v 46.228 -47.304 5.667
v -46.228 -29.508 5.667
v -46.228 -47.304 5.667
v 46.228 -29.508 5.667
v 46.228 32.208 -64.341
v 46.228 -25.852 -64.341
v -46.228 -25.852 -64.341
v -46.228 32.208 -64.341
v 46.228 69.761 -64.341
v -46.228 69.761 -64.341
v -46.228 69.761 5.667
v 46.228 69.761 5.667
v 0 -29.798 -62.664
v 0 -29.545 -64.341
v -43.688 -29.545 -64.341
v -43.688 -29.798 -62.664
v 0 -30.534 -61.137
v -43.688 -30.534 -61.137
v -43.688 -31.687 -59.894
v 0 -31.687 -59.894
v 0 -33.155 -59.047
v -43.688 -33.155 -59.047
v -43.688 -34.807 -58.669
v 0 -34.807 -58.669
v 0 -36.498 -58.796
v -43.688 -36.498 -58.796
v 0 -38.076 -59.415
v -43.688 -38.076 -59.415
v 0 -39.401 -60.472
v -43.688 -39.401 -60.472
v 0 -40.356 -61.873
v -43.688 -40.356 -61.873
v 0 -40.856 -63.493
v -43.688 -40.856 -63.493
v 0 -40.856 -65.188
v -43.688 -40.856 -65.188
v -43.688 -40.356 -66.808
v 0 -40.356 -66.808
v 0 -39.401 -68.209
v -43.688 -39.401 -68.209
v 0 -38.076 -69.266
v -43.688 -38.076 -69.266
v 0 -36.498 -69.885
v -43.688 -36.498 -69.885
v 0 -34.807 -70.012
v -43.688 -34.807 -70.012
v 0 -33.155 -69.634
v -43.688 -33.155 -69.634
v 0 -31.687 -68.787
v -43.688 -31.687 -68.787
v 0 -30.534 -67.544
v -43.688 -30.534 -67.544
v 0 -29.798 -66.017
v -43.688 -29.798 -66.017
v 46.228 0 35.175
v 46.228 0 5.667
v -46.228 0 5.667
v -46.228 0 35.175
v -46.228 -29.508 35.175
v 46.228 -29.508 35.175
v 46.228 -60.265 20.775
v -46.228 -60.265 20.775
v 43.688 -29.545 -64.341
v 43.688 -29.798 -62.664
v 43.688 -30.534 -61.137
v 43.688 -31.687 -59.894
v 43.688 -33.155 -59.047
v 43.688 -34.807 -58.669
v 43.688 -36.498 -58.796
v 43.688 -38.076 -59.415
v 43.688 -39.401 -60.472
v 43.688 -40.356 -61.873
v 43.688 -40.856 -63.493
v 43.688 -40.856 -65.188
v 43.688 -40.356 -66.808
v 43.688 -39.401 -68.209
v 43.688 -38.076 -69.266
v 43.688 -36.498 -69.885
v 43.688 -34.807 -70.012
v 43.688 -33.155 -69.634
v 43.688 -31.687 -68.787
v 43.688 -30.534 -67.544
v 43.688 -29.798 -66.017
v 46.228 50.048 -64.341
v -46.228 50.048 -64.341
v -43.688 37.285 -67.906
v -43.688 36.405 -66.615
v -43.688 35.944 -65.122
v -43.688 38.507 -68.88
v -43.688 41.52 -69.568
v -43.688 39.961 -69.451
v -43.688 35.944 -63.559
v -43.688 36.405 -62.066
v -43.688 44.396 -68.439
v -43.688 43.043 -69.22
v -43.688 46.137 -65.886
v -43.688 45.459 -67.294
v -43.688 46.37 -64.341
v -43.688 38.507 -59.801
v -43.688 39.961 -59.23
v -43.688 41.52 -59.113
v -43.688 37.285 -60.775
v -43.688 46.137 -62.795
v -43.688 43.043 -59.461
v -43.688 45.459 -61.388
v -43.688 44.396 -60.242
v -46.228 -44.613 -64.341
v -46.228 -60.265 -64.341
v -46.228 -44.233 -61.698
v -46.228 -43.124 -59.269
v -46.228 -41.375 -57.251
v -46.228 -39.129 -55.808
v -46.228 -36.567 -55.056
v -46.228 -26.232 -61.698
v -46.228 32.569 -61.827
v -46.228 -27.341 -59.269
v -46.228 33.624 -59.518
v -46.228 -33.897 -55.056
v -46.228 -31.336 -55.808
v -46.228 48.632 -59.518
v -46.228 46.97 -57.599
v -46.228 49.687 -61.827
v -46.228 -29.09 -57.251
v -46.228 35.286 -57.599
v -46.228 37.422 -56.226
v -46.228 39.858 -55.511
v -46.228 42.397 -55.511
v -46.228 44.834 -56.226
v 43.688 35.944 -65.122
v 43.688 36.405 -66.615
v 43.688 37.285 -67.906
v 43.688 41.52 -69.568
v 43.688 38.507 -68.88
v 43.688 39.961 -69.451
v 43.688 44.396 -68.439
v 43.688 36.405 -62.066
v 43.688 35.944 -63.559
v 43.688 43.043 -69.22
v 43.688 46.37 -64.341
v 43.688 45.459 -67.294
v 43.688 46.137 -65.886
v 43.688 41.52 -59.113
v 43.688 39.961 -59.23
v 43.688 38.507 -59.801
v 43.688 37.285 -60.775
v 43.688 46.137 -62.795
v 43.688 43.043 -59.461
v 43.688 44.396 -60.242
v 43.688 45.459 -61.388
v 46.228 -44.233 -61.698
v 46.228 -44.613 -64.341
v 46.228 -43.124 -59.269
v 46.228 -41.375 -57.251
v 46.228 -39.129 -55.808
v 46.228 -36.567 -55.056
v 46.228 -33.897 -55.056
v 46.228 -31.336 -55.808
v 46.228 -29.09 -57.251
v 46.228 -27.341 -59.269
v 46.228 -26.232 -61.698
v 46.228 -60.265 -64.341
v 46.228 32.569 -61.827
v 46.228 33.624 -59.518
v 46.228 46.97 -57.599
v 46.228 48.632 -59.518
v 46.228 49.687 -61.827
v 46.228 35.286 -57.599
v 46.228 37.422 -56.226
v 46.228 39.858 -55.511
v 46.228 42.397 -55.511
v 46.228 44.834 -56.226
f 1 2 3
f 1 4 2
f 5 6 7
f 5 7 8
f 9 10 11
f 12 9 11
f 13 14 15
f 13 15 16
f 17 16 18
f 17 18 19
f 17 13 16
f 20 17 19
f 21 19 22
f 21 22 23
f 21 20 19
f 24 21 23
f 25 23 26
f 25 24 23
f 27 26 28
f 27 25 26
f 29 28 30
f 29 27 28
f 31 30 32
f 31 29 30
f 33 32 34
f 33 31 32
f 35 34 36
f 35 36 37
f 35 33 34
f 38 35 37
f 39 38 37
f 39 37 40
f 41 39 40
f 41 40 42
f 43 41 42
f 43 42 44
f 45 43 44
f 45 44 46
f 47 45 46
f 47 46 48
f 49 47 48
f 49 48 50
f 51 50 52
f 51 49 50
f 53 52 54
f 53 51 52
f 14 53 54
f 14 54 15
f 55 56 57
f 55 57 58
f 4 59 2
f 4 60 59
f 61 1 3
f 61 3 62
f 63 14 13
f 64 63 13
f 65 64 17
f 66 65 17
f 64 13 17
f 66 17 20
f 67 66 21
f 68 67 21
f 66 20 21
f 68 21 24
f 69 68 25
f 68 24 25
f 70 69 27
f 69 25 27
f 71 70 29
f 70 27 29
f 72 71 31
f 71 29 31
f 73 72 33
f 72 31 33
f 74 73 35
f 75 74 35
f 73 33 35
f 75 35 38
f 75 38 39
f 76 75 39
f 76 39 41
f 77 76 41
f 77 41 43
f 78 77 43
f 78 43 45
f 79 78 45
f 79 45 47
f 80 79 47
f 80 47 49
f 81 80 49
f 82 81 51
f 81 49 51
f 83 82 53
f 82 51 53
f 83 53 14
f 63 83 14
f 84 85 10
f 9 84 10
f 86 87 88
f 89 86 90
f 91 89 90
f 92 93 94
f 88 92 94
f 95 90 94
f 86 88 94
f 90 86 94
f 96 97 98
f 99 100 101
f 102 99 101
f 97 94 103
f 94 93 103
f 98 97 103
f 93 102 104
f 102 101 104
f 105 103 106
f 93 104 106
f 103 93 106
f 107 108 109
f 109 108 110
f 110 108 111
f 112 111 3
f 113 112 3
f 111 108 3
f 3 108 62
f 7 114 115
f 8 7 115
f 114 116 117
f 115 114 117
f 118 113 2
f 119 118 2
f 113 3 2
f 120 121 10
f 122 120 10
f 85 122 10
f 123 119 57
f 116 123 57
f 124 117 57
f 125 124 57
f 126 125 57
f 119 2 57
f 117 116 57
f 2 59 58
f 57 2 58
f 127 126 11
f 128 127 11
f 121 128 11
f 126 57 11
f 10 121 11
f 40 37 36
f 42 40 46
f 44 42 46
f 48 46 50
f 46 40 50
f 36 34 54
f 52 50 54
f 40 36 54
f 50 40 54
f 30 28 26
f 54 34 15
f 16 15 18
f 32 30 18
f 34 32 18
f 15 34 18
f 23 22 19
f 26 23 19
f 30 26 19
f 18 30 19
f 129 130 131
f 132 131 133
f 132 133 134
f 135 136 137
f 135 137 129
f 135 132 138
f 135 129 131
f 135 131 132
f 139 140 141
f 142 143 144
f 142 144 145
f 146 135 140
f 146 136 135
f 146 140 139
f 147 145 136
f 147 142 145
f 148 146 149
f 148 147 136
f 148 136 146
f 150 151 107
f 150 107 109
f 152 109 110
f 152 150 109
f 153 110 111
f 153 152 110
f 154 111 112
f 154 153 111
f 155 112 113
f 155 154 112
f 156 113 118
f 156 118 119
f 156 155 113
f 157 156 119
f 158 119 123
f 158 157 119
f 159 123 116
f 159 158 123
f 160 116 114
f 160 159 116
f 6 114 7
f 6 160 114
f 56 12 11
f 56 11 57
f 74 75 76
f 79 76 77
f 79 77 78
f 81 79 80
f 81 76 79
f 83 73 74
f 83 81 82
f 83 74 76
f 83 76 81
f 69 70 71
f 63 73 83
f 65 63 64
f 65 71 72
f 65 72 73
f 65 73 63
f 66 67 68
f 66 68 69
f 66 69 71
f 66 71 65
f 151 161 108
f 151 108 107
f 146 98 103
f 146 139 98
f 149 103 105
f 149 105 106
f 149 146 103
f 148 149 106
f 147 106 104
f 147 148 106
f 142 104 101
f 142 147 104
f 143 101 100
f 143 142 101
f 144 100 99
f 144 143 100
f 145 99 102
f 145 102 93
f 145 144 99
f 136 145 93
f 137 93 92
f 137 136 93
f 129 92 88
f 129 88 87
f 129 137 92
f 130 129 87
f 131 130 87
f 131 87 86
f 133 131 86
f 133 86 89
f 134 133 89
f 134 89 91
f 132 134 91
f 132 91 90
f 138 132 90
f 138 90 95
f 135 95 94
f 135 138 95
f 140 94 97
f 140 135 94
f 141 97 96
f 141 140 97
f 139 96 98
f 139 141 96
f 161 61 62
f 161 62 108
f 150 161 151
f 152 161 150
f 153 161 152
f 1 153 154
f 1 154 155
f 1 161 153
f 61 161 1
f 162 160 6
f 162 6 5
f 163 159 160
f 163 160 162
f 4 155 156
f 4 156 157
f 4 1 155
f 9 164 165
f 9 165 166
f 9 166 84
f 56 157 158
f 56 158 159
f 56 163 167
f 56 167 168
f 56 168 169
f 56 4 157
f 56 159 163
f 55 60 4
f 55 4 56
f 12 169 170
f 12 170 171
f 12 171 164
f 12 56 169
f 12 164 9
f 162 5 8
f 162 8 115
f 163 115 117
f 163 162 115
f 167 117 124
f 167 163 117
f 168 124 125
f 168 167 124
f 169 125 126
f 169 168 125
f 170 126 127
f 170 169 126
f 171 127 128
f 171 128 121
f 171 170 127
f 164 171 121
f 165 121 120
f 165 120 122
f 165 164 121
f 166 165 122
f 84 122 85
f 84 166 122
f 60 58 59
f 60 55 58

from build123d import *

# Parameters (mm, degrees)
F1_DEPTH = 46.228
F2_R     = 5.686984
F2_R_2   = 5.242146
F3_DEPTH = 43.688


with BuildPart() as f1:
    # F0 (on Right) → F1 (new body, symmetric)
    with BuildSketch(Plane.YZ):
        with BuildLine():
            Line((-29.507887, 5.667107), (-47.304157, 5.667107))
            Line((-47.304157, 5.667107), (-60.264818, 20.774527))
            Line((-60.264818, 20.774527), (-60.264818, 5.667107))
            Line((-60.264818, 5.667107), (-60.264818, -64.340554))
            Line((-60.264818, -64.340554), (-44.612939, -64.340554))
            ThreePointArc((-44.612939, -64.340554), (-35.232473, -54.960088), (-25.852007, -64.340554))
            Line((-25.852007, -64.340554), (32.207619, -64.340554))
            ThreePointArc((32.207619, -64.340554), (41.127946, -55.420226), (50.048274, -64.340554))
            Line((50.048274, -64.340554), (69.761112, -64.340554))
            Line((69.761112, -64.340554), (69.761112, 5.667107))
            Line((69.761112, 5.667107), (0, 5.667107))
            Line((0, 5.667107), (0, 35.174993))
            Line((0, 35.174993), (-29.507887, 35.174993))
            Line((-29.507887, 35.174993), (-29.507887, 5.667107))
        make_face()
    extrude(amount=F1_DEPTH, both=True)


with BuildPart() as f3:
    # F2 (on Right) → F3 (new body, symmetric)
    with BuildSketch(Plane.YZ):
        with Locations((-35.232473, -64.340554)):
            Circle(F2_R)
        with Locations((41.127946, -64.340554)):
            Circle(F2_R_2)
    extrude(amount=F3_DEPTH, both=True)


solid = Compound([f1.part, f3.part])
